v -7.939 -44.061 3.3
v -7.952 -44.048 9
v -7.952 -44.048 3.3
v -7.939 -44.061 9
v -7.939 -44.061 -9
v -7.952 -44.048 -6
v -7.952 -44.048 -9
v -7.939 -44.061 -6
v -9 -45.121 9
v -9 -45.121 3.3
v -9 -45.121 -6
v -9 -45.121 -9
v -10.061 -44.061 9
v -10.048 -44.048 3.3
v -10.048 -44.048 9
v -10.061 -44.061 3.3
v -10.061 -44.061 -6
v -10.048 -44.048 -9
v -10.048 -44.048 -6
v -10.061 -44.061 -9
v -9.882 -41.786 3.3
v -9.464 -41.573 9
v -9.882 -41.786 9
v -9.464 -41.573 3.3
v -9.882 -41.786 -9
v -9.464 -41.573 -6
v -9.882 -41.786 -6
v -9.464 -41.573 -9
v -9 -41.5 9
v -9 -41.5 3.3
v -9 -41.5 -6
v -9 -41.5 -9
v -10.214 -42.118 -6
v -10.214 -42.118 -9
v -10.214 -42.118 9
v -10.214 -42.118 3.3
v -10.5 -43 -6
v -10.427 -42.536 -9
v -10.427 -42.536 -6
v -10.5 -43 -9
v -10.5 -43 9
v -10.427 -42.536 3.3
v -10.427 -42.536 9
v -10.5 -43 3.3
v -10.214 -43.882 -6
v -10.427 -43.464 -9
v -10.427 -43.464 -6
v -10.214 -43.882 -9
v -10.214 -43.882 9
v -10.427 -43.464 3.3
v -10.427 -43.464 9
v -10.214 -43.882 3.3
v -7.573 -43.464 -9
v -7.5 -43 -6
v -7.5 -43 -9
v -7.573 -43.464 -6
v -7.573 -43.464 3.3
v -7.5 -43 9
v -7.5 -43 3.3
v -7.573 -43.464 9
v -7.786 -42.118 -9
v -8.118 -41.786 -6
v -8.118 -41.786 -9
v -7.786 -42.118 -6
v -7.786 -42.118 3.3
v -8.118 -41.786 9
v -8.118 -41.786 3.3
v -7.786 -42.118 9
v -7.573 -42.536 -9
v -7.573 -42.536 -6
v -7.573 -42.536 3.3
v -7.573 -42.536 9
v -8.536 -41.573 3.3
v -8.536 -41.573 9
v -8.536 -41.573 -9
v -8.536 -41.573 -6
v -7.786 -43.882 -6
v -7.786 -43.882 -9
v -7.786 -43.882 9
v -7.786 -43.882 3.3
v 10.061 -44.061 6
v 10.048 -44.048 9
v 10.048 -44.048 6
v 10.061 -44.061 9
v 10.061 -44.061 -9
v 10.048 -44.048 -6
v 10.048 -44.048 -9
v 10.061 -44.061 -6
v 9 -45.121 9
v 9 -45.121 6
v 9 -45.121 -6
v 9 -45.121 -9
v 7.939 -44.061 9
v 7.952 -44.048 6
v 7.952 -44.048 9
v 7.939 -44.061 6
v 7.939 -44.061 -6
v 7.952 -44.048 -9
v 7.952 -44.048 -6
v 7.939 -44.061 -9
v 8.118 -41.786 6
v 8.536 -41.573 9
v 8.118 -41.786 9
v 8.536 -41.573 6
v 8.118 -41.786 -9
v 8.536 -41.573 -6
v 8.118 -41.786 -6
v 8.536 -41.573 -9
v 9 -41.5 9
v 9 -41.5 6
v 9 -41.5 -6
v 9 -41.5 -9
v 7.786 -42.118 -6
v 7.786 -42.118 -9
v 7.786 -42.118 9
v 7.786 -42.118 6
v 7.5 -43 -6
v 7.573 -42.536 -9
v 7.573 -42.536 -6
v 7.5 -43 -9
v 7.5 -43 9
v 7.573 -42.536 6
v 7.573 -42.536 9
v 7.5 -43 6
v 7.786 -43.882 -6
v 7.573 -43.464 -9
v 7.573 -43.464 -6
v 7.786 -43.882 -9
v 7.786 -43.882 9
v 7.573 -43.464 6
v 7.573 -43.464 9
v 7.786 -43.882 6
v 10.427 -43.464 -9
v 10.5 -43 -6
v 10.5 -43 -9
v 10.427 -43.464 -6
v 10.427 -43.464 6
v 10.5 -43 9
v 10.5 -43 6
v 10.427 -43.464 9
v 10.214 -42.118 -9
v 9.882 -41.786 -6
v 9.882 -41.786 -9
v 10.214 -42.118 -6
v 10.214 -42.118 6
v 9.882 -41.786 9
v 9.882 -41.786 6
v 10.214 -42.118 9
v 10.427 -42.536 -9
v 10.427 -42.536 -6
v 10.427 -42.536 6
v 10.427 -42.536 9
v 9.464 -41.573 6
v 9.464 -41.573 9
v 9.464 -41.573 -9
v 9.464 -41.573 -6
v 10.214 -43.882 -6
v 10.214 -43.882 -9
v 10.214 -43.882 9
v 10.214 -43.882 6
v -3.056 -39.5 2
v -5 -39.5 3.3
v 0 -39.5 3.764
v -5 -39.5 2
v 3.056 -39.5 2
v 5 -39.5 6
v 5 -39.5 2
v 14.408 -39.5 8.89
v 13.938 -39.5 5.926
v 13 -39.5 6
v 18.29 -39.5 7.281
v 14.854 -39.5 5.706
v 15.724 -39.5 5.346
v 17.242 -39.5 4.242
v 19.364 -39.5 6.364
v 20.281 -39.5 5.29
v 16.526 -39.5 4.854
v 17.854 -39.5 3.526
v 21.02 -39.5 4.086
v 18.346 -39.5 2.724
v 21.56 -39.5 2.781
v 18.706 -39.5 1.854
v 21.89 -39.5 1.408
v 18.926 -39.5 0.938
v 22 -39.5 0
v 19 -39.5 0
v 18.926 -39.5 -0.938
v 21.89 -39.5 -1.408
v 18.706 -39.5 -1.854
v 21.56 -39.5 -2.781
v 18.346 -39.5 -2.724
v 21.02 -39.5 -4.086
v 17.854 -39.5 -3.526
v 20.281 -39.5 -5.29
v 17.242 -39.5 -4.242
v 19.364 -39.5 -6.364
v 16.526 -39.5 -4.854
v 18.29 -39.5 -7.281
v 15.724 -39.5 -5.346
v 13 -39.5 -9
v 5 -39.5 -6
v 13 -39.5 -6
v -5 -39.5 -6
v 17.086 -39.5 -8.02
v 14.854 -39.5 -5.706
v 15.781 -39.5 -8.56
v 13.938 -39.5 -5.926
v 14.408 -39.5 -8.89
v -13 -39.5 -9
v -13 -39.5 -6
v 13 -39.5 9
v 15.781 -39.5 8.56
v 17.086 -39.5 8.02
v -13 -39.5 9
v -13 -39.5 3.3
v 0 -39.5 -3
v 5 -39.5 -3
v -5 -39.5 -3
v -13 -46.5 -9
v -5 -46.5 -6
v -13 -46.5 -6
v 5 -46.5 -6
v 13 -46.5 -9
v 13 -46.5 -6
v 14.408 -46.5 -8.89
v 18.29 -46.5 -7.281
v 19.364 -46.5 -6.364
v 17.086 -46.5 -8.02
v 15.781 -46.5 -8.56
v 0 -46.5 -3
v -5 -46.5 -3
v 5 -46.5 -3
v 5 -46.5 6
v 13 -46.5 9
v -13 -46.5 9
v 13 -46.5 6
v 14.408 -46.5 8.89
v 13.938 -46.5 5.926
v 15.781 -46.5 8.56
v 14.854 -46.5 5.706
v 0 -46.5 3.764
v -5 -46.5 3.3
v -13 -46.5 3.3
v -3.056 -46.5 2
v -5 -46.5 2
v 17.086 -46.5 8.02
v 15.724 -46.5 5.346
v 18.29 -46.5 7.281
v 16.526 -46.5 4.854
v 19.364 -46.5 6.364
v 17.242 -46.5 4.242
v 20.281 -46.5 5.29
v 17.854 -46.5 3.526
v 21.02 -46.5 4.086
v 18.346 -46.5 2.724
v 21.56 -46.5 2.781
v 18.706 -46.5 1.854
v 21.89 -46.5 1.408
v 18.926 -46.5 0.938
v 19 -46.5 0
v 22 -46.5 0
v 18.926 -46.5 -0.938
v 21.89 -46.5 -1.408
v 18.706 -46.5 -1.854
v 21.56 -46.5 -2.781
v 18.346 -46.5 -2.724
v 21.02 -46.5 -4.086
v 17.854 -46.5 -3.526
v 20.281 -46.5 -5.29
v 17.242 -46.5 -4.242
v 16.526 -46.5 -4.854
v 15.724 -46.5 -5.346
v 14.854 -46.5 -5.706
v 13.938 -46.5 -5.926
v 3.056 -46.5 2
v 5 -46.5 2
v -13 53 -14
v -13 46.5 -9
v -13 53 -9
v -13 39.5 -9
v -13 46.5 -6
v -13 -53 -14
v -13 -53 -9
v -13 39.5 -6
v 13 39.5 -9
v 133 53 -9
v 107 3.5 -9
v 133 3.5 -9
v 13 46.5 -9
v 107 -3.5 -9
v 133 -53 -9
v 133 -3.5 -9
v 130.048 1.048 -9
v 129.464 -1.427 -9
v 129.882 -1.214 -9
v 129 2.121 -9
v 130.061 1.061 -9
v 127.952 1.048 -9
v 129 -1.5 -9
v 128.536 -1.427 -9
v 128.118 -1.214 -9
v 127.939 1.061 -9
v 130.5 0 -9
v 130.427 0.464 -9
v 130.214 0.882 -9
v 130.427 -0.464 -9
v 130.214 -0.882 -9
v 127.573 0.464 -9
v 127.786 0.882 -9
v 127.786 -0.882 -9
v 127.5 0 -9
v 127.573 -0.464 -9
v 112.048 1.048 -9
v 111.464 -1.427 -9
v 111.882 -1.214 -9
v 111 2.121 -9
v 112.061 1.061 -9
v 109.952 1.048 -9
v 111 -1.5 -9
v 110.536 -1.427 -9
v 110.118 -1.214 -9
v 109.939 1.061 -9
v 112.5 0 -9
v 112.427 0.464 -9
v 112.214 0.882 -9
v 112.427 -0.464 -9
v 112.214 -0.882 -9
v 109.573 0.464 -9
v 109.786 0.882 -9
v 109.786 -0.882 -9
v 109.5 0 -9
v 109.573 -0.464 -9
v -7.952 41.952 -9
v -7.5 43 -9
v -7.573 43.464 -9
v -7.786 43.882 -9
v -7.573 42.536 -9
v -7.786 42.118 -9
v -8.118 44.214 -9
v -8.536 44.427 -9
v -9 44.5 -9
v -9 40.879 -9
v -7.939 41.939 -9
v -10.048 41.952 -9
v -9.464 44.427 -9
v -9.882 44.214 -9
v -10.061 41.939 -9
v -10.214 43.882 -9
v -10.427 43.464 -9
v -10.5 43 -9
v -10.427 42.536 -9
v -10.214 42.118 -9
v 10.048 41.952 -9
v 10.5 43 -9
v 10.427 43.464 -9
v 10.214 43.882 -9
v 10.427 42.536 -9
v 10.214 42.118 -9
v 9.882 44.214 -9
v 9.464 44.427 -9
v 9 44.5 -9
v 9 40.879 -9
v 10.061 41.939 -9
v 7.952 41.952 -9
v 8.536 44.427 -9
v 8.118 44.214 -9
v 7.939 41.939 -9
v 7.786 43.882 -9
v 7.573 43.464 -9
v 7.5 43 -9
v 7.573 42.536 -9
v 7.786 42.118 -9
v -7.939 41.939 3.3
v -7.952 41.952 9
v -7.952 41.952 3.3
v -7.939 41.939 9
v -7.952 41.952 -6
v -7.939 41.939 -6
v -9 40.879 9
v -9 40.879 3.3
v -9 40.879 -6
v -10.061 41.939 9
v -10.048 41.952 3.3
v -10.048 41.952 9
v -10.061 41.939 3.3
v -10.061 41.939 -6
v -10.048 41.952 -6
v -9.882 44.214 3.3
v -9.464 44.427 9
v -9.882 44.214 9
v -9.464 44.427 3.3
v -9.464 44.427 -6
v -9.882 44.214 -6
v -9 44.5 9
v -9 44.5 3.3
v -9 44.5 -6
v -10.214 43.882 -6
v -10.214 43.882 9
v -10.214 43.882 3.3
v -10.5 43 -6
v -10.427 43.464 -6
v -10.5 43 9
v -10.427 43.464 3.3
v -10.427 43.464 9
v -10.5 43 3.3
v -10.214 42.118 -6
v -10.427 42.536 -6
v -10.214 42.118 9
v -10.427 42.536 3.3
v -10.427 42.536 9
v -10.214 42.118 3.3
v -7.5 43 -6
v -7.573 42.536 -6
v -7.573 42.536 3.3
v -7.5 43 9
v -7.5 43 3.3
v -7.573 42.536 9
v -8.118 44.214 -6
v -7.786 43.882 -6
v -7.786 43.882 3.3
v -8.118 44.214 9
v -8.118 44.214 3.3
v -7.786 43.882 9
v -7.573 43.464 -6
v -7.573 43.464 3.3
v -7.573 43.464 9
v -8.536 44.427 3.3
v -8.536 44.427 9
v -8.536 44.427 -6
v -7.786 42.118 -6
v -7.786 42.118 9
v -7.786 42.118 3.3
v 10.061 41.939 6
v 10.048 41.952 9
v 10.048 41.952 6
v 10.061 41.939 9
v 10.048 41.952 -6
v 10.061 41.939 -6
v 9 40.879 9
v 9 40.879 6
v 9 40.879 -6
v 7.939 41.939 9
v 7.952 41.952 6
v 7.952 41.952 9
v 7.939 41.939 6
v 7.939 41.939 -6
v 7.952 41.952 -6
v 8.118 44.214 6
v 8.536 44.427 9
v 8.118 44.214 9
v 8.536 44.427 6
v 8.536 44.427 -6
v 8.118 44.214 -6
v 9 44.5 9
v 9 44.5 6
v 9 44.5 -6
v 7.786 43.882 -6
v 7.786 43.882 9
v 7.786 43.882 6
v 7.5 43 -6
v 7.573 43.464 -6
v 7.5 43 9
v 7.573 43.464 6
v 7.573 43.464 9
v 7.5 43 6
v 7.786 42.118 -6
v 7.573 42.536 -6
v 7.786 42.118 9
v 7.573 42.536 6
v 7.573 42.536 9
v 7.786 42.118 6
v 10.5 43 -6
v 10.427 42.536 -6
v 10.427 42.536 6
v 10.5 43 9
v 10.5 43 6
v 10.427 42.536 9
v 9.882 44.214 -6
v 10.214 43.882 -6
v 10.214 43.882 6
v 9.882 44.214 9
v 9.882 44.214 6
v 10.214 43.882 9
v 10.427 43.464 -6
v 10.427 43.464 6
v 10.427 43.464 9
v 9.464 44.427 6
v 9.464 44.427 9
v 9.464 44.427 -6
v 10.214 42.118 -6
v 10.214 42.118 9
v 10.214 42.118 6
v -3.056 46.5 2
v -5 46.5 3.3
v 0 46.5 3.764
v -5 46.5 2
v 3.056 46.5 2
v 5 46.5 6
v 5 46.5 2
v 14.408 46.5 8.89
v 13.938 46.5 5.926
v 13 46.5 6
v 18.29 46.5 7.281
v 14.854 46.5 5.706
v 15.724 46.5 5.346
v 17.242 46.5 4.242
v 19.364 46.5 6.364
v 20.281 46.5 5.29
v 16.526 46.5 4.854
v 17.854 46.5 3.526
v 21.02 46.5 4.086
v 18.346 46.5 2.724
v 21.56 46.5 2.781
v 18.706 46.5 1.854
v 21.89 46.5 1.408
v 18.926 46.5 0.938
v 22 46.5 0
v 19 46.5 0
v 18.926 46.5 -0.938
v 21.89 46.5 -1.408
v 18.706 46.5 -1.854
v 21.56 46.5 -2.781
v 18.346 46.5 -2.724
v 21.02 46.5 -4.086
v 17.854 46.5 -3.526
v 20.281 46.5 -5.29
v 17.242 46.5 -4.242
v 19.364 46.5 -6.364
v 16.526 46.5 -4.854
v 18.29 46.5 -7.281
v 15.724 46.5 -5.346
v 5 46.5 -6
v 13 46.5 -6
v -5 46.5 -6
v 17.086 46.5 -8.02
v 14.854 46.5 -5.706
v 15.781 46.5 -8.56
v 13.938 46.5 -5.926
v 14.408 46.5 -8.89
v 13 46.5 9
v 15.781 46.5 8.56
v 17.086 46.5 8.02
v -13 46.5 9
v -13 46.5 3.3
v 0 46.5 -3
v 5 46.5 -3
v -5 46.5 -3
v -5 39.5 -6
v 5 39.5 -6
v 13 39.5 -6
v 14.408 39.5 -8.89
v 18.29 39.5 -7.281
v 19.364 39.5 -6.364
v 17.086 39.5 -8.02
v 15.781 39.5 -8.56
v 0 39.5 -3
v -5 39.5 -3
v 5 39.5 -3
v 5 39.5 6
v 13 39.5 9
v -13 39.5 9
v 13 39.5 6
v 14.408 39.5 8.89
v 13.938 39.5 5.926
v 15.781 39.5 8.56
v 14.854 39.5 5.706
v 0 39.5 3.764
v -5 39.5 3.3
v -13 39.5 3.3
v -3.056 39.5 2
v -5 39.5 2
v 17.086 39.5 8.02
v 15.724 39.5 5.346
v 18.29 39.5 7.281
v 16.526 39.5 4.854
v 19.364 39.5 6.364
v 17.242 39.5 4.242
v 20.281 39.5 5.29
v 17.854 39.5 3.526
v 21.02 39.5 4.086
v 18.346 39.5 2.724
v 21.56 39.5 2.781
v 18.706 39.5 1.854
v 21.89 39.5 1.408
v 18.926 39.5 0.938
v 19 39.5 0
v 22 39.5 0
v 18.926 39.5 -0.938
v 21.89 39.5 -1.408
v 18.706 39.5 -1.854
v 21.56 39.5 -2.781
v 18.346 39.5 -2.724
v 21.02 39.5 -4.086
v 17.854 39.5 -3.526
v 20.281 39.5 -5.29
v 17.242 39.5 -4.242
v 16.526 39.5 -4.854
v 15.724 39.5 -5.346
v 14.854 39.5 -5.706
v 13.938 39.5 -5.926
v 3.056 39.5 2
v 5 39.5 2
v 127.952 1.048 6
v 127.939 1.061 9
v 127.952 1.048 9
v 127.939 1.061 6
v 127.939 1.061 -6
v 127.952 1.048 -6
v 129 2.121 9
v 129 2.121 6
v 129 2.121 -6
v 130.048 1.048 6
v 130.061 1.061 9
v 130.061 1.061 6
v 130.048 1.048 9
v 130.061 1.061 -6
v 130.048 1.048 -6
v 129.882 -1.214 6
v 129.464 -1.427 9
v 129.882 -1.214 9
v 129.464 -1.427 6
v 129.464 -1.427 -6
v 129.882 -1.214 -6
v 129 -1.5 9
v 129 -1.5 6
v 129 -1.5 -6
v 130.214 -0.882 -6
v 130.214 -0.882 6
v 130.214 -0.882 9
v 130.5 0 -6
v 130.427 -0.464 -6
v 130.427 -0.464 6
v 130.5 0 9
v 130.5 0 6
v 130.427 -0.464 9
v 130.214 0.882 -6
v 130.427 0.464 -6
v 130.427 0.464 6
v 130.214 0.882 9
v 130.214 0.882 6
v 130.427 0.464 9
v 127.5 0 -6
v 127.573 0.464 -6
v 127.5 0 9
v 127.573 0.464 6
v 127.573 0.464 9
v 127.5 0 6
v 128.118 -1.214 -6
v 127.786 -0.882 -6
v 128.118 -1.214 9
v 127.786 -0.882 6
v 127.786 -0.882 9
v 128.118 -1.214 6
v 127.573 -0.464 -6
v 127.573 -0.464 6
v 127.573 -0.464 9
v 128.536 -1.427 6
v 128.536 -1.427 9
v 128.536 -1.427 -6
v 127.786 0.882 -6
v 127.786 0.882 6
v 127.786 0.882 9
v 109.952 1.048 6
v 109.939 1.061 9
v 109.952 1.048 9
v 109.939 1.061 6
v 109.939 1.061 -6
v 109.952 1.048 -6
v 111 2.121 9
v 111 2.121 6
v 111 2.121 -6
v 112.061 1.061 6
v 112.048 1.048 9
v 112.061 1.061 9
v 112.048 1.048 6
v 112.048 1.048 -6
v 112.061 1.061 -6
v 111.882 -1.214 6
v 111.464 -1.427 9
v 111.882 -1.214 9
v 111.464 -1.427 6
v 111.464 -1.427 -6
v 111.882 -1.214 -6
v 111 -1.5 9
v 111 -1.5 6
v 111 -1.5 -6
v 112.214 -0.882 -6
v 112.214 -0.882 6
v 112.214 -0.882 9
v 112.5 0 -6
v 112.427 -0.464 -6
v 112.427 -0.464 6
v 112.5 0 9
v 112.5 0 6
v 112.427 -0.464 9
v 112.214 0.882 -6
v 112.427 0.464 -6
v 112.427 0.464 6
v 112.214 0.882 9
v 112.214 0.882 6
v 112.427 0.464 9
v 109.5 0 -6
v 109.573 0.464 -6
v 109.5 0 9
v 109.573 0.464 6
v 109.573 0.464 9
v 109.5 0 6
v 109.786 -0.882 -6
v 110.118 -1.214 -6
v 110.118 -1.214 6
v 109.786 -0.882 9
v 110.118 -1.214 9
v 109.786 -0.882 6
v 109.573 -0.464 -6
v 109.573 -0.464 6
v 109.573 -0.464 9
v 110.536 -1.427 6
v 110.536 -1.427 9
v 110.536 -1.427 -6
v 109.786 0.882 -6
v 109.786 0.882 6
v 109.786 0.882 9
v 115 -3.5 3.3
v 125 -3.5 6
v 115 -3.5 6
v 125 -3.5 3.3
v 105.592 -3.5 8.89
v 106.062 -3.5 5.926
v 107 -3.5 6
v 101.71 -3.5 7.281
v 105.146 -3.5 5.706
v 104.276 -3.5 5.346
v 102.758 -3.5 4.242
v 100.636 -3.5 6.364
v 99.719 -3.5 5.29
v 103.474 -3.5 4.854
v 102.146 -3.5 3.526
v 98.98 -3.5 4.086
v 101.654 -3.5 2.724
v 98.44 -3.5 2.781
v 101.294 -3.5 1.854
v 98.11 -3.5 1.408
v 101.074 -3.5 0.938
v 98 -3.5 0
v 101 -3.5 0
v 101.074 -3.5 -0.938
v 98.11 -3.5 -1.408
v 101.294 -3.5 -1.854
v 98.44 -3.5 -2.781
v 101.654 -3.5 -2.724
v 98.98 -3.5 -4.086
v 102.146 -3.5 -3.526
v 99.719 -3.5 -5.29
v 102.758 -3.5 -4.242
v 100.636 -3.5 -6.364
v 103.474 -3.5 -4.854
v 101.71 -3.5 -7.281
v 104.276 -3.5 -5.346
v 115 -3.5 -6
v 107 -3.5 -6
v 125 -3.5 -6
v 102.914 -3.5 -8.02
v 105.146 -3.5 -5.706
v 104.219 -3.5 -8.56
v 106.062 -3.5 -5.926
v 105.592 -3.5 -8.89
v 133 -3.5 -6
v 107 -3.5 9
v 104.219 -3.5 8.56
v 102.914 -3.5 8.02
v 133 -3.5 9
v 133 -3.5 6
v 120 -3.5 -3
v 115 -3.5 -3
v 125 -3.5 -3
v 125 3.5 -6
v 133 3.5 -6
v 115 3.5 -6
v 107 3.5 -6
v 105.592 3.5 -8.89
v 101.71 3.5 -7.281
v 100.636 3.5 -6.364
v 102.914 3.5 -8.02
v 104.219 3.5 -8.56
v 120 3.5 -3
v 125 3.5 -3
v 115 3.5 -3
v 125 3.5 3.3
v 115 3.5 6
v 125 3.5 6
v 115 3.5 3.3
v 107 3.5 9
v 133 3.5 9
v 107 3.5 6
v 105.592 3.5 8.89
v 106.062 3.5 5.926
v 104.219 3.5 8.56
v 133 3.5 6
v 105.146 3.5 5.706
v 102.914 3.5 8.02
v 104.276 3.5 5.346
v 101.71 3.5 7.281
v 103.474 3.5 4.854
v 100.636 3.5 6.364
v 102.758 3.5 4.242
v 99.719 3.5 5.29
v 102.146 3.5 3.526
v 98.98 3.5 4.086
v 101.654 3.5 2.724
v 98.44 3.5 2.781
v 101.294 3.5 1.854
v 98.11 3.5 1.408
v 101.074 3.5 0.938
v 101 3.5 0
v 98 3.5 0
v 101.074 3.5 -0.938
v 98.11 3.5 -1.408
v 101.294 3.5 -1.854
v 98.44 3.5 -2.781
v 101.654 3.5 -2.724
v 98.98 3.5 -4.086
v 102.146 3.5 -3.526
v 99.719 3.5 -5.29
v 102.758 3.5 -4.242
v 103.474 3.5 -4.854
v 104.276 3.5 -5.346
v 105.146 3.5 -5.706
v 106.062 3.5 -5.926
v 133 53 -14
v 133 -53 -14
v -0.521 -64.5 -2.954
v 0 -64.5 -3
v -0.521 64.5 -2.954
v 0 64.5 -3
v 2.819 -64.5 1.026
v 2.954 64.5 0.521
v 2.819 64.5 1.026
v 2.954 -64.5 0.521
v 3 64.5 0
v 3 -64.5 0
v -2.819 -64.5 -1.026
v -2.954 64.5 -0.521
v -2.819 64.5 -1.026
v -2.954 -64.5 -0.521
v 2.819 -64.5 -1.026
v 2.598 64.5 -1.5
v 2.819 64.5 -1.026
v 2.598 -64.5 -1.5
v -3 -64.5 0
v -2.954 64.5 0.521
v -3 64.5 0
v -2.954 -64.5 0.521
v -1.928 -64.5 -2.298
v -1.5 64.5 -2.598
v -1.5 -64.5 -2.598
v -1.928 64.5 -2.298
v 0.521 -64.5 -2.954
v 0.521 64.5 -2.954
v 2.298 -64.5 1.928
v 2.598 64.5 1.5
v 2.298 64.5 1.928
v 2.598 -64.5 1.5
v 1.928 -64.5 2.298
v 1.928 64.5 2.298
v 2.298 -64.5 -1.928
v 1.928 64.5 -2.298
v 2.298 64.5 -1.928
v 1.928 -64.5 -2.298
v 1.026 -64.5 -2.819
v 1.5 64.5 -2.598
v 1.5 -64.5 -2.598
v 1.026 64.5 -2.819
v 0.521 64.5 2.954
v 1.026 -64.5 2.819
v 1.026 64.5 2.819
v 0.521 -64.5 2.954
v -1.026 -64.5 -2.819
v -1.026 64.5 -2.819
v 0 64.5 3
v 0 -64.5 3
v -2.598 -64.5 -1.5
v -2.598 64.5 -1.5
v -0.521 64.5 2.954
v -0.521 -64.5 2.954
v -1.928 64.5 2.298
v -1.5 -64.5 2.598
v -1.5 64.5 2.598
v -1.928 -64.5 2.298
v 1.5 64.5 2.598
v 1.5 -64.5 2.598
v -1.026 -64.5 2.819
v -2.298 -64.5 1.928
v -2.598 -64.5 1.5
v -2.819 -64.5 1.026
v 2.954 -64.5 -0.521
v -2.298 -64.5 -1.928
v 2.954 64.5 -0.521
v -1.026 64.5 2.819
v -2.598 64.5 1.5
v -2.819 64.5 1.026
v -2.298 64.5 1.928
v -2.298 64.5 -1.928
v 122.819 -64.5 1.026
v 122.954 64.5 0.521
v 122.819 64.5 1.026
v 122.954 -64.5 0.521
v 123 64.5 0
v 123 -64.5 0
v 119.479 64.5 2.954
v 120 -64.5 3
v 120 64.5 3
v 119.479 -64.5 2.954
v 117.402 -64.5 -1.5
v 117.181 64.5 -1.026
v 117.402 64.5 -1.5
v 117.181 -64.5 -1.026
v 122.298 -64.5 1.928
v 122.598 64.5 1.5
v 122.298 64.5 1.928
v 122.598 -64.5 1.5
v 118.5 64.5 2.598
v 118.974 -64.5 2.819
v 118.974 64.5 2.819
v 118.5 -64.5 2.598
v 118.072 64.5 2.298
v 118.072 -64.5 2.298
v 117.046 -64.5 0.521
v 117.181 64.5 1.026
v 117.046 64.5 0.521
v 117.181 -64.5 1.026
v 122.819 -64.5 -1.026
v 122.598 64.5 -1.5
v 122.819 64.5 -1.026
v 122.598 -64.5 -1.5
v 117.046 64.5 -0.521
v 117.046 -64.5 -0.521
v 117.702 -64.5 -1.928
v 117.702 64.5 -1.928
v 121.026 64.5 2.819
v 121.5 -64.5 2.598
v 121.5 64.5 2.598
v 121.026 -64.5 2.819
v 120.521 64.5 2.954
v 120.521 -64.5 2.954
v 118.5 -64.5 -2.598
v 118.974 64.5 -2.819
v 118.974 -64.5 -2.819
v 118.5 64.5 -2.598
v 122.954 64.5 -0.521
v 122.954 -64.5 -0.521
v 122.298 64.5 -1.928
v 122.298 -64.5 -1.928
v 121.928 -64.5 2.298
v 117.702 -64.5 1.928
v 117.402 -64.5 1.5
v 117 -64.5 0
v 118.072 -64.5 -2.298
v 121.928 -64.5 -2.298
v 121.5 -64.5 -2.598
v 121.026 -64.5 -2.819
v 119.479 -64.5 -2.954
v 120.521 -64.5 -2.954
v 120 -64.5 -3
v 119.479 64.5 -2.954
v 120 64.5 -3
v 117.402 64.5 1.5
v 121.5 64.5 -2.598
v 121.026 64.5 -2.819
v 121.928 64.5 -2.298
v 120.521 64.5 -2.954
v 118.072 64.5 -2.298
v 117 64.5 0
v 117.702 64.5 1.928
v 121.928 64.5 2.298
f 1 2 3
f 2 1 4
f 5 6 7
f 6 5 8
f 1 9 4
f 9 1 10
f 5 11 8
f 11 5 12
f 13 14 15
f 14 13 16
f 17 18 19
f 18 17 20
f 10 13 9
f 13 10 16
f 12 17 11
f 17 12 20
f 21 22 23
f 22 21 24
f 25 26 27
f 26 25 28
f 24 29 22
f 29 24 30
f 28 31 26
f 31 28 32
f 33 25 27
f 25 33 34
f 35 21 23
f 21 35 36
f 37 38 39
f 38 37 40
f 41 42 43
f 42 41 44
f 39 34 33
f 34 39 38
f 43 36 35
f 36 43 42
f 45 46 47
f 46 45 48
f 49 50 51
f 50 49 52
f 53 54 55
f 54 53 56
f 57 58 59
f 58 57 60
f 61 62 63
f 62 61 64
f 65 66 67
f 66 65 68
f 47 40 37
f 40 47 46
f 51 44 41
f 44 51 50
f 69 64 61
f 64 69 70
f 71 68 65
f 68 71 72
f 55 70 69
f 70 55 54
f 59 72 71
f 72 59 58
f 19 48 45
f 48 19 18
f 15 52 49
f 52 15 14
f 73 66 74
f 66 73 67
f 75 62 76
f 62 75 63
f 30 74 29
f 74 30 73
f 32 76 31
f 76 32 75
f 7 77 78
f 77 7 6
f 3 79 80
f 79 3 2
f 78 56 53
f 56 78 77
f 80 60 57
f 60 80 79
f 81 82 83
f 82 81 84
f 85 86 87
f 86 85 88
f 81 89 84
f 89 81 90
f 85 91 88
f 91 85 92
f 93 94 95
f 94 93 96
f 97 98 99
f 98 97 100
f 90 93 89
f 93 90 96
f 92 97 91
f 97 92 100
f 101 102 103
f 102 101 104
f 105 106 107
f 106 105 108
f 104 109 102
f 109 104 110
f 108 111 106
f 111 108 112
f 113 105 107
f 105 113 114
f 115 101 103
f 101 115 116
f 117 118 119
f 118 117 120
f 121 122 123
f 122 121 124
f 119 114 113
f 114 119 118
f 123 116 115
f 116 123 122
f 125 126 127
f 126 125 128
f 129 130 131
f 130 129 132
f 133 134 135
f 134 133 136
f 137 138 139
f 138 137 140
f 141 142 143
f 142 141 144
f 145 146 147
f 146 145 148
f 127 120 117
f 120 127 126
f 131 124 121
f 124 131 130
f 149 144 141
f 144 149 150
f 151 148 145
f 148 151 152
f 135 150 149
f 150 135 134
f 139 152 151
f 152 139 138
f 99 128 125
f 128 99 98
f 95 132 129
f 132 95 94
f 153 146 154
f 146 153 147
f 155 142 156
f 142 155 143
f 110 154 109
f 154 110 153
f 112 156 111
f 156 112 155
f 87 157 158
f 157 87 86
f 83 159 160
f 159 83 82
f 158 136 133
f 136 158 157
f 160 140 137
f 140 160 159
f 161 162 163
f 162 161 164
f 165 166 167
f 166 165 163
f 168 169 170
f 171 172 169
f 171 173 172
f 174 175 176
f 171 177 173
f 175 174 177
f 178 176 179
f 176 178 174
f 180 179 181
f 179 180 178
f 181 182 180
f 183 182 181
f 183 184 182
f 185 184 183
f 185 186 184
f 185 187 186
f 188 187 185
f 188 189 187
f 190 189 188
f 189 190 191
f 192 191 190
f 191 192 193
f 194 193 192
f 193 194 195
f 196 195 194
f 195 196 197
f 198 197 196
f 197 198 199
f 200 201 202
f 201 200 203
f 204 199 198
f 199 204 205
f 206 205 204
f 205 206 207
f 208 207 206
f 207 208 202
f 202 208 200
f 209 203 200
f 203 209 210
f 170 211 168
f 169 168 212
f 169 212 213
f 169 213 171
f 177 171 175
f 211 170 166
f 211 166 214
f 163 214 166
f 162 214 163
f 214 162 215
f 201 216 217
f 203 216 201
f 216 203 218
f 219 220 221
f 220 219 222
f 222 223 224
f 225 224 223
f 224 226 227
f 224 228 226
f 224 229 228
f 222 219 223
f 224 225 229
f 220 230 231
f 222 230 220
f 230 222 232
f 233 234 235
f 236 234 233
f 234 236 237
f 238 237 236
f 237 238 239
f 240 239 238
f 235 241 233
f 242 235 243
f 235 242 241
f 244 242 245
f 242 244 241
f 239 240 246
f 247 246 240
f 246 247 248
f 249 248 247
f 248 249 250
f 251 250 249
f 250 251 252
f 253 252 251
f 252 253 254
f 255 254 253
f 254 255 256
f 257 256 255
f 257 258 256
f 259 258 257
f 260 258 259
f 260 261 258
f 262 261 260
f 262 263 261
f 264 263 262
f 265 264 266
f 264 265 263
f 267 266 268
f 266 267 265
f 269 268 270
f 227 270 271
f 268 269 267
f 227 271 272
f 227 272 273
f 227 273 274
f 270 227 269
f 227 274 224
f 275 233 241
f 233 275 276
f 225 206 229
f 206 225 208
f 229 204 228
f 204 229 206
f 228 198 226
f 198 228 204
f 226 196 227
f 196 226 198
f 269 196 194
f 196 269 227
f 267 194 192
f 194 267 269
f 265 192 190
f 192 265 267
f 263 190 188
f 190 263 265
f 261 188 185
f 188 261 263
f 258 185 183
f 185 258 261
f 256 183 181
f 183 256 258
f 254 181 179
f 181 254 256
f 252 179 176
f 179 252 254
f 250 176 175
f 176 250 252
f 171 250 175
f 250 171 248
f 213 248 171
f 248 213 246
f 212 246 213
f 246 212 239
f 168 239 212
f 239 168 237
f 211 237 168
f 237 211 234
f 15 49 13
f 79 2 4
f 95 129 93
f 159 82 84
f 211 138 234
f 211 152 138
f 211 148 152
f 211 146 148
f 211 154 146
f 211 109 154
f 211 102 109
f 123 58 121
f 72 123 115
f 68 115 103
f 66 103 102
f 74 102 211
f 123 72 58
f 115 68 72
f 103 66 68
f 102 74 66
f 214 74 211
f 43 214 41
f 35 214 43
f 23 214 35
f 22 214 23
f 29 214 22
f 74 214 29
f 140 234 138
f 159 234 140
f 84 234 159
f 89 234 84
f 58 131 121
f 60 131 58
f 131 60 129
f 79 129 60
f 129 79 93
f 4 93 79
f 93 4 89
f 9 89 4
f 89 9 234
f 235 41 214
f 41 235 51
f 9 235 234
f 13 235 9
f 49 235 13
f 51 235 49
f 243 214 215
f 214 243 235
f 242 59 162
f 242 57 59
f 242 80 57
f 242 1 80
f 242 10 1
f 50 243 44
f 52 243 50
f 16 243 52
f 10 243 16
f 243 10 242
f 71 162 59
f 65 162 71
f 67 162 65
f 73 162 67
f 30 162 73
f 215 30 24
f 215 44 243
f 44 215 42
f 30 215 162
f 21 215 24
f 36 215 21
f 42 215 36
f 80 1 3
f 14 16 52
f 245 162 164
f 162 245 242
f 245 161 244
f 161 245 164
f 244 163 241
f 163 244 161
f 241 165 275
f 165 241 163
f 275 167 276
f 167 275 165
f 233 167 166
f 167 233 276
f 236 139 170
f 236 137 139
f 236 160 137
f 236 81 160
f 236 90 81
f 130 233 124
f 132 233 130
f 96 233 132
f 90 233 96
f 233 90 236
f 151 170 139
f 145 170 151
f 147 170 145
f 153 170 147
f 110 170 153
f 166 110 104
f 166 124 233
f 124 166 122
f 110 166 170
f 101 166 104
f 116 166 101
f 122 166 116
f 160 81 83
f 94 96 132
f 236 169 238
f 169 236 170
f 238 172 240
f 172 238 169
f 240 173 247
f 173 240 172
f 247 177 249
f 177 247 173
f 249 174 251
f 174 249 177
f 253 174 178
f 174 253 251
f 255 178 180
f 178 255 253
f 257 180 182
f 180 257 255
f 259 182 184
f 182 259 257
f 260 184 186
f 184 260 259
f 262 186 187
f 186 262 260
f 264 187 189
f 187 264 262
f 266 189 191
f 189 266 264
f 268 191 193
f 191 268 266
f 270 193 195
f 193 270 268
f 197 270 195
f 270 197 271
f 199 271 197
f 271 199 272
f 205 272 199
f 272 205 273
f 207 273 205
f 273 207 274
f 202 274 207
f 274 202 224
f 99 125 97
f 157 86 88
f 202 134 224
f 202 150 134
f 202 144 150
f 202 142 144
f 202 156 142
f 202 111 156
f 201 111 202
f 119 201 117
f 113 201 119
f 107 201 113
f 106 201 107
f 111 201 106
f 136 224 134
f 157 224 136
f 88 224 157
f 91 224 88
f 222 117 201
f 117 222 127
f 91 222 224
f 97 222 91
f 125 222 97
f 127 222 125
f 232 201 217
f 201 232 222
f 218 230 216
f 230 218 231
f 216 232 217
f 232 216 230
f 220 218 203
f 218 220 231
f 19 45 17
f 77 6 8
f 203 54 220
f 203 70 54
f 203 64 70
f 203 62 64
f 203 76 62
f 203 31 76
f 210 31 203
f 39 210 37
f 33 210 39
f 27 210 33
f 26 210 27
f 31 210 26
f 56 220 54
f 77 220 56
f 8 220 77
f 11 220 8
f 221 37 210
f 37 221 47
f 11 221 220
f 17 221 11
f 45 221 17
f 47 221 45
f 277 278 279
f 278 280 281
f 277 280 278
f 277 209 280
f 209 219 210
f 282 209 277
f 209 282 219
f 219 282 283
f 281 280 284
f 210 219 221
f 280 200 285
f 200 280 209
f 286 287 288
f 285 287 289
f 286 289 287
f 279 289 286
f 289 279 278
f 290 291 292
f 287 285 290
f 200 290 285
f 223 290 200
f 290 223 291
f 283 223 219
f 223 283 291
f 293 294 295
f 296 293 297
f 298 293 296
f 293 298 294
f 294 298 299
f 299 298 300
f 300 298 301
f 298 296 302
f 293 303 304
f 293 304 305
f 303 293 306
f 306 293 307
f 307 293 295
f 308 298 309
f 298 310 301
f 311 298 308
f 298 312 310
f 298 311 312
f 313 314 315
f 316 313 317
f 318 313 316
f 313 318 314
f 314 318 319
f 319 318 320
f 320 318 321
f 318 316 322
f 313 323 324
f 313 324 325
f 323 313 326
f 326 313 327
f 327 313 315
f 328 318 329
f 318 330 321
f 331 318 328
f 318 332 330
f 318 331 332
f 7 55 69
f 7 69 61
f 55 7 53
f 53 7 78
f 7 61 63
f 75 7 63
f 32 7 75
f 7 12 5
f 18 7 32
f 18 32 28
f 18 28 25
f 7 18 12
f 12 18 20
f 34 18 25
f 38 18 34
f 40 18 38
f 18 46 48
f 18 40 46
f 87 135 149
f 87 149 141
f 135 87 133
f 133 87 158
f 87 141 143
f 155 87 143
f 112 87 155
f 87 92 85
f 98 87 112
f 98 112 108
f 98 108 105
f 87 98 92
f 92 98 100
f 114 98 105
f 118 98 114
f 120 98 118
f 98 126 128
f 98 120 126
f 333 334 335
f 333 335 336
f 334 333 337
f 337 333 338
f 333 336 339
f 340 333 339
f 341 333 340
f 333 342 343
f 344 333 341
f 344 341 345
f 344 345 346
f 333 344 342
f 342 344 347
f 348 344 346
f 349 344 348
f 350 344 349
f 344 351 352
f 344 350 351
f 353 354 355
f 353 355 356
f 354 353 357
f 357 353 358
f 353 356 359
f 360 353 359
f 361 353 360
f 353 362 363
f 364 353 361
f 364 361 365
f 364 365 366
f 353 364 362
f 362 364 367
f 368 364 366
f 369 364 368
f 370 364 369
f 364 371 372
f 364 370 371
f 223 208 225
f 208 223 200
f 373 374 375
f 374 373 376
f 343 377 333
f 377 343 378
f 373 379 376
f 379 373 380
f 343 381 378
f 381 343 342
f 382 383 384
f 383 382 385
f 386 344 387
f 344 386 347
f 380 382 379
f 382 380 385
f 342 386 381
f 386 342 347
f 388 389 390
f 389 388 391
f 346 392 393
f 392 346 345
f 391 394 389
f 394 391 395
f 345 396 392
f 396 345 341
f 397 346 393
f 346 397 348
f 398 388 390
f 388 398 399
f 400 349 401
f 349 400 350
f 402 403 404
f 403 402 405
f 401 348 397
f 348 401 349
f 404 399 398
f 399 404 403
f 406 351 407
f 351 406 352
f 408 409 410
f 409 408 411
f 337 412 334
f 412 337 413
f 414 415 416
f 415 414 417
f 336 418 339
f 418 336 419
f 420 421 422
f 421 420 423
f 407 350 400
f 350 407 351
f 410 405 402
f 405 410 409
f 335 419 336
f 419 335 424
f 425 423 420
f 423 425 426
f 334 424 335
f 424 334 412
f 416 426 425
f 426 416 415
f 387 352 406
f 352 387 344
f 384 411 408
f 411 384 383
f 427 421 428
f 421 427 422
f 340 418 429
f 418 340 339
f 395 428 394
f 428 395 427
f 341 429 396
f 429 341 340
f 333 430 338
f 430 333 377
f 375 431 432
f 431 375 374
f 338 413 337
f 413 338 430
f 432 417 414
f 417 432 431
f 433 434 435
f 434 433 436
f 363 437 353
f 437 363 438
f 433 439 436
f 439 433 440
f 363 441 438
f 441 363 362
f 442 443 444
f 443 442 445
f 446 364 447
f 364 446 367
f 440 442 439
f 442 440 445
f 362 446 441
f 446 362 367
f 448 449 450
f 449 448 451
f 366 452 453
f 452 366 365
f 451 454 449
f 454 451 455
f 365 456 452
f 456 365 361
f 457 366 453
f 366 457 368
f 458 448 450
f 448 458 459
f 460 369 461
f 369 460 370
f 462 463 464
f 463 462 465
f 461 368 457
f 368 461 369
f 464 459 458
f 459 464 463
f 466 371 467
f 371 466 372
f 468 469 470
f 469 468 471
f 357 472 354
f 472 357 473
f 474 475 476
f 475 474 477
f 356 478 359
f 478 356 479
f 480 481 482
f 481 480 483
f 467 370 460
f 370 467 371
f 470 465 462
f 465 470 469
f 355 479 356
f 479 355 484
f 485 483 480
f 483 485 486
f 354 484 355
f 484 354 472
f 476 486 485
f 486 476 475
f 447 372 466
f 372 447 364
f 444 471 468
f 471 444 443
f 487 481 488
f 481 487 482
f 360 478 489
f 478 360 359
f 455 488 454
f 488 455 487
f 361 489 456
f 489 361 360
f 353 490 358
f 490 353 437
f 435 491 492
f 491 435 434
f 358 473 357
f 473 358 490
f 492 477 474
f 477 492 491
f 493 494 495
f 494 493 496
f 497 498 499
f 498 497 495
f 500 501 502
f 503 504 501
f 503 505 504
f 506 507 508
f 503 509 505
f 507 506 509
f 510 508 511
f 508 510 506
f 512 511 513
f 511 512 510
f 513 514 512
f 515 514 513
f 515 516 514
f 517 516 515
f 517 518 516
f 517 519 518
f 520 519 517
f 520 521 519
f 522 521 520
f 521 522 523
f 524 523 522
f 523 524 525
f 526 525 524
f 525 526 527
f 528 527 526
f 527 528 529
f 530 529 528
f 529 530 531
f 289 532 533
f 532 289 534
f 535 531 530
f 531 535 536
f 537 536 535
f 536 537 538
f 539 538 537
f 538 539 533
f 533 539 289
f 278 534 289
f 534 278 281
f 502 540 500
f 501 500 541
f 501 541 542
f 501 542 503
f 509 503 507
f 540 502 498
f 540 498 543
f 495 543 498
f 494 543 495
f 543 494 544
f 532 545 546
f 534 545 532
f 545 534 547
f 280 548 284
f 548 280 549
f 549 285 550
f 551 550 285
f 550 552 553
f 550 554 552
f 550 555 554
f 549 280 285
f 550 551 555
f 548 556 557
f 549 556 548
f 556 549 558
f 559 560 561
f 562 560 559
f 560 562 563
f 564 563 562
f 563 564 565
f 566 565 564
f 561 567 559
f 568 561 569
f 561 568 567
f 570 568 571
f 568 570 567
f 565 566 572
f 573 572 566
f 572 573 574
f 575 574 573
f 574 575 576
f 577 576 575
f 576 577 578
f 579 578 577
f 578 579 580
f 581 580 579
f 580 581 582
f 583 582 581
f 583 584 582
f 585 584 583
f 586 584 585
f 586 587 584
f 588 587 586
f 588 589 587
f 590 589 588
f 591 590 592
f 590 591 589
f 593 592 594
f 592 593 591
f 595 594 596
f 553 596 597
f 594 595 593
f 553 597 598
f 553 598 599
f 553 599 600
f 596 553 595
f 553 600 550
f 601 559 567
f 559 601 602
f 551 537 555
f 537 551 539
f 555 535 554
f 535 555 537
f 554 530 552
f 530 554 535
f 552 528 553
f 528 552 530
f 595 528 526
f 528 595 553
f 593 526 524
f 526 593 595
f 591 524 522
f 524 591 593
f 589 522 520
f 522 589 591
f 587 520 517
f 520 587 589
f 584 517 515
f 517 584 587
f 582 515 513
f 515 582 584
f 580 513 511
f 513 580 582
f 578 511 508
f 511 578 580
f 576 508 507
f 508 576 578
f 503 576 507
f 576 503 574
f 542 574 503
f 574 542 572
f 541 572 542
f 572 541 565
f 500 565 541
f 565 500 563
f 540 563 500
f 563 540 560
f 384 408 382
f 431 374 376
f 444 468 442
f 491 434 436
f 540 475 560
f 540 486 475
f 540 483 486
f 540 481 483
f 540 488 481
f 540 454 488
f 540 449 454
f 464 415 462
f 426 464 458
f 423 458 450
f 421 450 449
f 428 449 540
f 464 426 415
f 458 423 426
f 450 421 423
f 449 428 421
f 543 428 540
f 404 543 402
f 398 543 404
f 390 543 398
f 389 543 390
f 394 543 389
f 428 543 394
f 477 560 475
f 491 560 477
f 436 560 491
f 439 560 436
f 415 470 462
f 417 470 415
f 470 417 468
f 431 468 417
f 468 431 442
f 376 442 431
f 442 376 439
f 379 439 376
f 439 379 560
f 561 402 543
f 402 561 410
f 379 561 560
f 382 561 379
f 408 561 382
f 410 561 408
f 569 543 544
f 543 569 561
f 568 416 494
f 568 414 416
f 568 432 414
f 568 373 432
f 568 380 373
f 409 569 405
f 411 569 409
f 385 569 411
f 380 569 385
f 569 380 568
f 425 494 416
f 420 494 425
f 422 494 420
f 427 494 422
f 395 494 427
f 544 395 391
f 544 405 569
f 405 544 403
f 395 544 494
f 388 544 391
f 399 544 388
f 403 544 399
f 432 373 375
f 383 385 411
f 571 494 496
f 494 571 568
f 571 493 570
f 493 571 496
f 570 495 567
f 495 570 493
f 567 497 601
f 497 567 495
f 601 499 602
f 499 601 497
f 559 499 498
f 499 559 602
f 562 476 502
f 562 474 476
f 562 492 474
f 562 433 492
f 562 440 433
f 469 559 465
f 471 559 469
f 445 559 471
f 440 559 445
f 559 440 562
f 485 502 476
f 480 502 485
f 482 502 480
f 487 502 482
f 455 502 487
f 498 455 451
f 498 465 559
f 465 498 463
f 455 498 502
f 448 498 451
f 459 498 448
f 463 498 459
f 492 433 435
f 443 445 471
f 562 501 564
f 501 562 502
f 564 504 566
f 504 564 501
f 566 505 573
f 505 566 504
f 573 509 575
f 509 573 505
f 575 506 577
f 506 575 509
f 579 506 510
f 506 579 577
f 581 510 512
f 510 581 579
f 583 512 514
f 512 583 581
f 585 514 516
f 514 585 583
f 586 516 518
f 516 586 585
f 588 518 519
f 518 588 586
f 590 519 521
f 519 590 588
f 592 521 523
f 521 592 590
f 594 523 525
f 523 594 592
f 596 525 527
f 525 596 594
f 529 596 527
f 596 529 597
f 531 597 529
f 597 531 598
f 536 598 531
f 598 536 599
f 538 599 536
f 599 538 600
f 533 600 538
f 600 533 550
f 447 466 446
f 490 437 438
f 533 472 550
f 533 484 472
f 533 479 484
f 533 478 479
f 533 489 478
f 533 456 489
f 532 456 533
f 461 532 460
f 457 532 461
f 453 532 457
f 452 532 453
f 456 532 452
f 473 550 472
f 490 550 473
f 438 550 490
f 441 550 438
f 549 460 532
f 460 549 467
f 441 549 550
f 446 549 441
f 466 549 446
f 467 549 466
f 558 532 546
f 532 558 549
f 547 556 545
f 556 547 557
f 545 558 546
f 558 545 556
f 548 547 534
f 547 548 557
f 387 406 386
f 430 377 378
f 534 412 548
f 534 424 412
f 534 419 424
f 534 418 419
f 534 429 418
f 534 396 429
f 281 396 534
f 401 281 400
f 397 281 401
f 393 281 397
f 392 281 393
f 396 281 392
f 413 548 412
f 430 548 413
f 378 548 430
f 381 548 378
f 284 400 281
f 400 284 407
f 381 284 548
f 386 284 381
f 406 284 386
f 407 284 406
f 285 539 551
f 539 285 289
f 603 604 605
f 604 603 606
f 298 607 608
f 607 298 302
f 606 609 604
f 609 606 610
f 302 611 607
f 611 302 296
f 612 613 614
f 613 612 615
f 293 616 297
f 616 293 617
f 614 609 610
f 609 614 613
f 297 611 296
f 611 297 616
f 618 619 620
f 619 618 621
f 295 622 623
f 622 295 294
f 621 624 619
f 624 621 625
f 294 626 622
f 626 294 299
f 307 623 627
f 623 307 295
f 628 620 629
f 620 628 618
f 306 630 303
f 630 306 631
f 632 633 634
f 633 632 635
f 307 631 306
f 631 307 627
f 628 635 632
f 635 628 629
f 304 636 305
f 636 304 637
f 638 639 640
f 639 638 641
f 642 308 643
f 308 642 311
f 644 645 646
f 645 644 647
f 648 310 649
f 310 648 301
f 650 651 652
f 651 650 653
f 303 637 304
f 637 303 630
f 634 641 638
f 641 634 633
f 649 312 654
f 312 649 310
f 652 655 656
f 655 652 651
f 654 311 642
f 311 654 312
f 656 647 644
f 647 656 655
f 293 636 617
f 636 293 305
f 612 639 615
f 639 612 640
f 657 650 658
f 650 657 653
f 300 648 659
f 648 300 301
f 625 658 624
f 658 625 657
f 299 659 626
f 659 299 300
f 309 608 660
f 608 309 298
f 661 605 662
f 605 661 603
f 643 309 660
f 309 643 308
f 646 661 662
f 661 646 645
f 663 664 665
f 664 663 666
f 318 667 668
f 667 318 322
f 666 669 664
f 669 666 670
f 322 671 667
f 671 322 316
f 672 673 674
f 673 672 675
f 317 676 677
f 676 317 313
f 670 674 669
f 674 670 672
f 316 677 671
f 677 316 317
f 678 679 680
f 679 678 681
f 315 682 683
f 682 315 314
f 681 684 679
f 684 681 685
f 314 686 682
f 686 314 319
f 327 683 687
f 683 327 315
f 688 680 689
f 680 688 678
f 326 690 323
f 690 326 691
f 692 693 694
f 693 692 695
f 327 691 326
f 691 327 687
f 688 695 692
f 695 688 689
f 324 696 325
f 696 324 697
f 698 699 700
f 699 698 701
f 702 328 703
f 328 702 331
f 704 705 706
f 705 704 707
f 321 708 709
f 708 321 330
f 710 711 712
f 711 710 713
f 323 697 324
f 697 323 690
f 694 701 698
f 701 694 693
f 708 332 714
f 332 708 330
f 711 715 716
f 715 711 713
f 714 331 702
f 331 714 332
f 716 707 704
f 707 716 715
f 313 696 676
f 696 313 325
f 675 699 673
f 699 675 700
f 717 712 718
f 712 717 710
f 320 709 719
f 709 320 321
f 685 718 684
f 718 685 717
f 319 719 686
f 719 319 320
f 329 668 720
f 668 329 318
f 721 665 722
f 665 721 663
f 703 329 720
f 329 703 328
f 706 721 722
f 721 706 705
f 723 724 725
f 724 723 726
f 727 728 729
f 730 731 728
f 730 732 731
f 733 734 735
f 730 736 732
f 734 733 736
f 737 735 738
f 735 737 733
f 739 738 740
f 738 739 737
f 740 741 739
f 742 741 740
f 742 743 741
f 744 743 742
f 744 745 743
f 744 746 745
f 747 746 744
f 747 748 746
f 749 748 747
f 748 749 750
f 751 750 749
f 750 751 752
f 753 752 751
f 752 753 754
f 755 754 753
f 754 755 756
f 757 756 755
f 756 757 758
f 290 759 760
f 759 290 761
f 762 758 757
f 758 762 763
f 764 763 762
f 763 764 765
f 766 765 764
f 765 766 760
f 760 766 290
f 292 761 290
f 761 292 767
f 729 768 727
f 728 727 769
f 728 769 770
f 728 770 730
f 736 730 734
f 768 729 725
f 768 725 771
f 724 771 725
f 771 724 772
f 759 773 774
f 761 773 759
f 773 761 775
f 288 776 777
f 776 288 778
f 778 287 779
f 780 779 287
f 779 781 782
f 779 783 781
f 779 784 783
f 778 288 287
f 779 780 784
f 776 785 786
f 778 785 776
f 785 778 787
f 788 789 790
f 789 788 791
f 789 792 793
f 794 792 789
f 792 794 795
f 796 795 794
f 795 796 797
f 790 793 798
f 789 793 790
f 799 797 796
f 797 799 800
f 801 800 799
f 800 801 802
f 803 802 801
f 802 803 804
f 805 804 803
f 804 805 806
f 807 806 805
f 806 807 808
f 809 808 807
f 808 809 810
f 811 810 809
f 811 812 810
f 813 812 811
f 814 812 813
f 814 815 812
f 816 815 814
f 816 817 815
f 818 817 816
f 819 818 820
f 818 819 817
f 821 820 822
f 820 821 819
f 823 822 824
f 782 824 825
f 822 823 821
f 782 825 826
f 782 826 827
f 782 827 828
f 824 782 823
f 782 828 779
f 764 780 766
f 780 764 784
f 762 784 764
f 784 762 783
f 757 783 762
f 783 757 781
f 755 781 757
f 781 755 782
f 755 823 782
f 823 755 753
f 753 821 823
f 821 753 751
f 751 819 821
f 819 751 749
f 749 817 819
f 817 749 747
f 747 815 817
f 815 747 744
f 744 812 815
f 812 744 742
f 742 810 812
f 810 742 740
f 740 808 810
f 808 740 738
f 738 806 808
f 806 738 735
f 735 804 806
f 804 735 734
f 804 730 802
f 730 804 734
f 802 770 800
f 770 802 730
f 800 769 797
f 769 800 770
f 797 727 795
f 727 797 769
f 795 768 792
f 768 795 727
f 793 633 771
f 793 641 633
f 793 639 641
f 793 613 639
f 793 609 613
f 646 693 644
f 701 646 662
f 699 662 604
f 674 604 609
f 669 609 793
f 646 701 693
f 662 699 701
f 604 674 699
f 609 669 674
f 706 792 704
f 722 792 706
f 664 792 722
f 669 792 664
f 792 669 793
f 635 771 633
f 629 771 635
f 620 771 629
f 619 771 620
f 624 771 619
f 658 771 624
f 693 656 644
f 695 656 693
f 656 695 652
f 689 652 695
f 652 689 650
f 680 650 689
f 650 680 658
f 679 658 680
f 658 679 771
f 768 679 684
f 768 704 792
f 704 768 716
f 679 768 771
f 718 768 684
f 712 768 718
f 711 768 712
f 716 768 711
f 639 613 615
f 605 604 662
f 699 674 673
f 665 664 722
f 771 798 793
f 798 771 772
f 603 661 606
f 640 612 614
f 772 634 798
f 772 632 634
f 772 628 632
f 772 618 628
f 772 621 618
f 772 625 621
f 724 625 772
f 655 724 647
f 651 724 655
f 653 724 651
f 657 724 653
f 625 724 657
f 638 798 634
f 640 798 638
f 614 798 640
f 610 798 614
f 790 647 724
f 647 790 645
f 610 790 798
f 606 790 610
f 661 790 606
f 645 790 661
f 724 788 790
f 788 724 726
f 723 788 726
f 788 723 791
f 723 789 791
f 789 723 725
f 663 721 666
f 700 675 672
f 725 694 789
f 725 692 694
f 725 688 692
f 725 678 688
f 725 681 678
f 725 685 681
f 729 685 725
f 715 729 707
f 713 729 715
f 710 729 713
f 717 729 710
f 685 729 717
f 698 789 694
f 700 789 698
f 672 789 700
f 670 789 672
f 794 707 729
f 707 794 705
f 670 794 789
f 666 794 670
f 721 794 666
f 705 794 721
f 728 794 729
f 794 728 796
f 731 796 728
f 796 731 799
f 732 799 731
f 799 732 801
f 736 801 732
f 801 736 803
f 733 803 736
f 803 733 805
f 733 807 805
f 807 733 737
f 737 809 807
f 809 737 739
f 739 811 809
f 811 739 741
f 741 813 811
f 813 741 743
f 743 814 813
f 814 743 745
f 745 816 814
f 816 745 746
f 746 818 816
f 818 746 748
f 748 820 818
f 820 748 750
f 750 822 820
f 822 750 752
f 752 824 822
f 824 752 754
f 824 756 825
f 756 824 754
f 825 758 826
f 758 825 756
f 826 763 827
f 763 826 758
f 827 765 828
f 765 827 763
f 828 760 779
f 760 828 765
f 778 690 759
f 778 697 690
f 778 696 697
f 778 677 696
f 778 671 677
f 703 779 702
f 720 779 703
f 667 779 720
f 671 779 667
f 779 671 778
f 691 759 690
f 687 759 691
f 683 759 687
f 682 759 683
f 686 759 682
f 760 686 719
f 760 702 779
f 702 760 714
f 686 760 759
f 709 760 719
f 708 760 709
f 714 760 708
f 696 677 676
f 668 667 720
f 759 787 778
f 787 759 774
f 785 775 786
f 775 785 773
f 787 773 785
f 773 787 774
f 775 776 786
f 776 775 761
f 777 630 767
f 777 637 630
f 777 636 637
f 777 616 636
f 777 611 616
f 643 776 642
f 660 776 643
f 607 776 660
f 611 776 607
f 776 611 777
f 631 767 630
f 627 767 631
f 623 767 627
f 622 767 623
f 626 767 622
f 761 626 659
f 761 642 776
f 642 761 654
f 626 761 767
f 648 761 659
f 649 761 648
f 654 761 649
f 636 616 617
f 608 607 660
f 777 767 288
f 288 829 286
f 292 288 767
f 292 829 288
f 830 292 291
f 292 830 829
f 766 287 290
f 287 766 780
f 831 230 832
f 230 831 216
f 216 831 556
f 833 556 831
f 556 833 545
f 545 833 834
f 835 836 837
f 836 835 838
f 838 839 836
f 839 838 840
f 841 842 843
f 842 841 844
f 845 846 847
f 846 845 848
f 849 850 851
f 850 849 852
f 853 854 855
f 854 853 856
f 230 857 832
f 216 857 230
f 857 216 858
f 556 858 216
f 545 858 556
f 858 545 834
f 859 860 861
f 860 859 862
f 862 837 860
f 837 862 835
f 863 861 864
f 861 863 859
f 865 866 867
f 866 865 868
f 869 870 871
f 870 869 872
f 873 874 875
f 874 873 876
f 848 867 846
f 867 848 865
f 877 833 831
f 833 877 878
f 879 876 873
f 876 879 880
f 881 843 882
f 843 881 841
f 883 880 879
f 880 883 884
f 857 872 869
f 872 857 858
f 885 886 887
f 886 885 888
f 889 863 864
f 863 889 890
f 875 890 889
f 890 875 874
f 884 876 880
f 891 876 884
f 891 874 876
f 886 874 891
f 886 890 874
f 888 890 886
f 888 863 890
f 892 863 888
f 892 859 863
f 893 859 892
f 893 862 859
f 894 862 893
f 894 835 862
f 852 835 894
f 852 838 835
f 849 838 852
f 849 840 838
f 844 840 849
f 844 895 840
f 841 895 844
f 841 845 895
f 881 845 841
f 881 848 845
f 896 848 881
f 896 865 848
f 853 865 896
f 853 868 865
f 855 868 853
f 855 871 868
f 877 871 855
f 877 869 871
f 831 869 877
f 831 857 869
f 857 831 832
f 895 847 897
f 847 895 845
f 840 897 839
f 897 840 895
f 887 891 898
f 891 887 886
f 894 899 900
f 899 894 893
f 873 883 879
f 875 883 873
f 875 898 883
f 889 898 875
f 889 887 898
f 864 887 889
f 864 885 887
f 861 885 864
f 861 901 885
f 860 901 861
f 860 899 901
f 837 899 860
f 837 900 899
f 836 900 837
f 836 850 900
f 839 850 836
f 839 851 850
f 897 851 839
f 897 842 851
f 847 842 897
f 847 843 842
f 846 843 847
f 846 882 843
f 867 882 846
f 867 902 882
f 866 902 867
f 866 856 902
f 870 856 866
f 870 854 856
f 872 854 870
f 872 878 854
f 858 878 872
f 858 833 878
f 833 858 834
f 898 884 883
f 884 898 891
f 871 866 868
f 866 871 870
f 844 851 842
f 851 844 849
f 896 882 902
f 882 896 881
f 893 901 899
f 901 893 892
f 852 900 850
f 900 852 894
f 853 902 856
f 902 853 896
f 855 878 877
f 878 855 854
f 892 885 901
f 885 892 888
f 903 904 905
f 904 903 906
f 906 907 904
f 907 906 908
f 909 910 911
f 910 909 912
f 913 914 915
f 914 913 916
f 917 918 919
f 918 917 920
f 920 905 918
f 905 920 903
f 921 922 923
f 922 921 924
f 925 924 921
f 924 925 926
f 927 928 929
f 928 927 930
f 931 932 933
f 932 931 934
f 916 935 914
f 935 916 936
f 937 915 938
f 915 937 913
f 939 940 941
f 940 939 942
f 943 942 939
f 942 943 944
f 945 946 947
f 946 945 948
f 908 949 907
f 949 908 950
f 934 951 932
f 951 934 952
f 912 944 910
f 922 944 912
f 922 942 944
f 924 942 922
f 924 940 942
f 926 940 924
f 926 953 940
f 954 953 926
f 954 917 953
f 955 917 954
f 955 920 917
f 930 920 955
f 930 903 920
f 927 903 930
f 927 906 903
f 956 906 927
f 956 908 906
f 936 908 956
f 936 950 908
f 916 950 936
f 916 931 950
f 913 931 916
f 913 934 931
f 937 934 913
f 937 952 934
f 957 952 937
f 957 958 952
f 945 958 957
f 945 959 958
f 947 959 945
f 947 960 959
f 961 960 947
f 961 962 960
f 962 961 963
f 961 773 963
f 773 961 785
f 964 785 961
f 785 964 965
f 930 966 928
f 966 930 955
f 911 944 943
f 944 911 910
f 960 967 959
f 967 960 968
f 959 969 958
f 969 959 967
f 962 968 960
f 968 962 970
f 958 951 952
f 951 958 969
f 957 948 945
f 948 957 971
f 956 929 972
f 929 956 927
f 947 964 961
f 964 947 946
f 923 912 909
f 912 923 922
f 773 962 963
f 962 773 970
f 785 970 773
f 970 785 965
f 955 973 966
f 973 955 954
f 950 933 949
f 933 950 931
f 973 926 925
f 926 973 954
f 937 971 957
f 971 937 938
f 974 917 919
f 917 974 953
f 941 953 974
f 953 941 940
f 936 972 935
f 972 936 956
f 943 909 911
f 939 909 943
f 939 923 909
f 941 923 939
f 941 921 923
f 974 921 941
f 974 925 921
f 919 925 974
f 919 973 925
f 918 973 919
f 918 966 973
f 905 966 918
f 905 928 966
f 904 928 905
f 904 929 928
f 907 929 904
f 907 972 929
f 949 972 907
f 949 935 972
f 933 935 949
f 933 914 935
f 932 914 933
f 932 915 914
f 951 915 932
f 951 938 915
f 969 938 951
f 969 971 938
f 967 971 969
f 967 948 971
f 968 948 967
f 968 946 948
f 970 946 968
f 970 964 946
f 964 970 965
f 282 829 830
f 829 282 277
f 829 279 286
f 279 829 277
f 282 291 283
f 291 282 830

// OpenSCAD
// file: parameters.scad
// Parameters file for RepRap Huxley

pi=3.14159265;

// The relative location in your file system where the .dxf files are
// DXFs are for quick development.  They should be replaced by parameterised CSG in dure course.

fileroot="DXF-files/";

rodsize = 6;	//threaded/smooth rod diameter in mm
xaxis = 182.5;	//width of base in mm
yaxis = 266.5;	//length of base in mm


screwsize = 3;	//bearing bore/screw diameter in mm
bearingsize = 10;	//outer diameter of bearings in mm
bearingwidth = 4;	//width of bearings in mm


rodpitch = rodsize / 6;
rodnutsize = 0.8 * rodsize;
rodnutdiameter = 1.9 * rodsize;
rodwashersize = 0.2 * rodsize;
rodwasherdiameter = 2 * rodsize;
screwpitch = screwsize / 6;
nutsize = 0.8 * screwsize;
nutdiameter = 1.9 * screwsize;
washersize = 0.2 * screwsize;
washerdiameter = 2 * screwsize;
partthick = 2 * rodsize;
vertexrodspace = 2 * rodsize;


c = [0.3, 0.3, 0.3];
rodendoffset = rodnutsize + rodwashersize * 2 + partthick / 2;
vertexoffset = vertexrodspace + rodendoffset;


renderrodthreads = false;
renderscrewthreads = false;
fn = 36;

// The gap between the joining rods at a vertex

vertex_radius=sqrt(rodsize*rodsize + vertexoffset*vertexoffset);
vertex_ang = atan(vertexoffset/rodsize)-30;
vertex_gap = 2*vertex_radius*cos(vertex_ang);

// Nema 14 dimensions - these are absolute

nema14_square=35.3;
nema14_screws=26;
nema14_screw_r=1.5;
nema14_hub=22;
nema14_hub_depth=2;
nema14_length=36;
nema14_shaft=5;
nema14_shaft_length=66;
nema14_shaft_projection=19;

// Nema 11 dimensions - these are absolute

nema11_square=28.5;
nema11_screws=23;
nema11_screw_r=1.25;
nema11_hub=22;
nema11_hub_depth=2;
nema11_length=44.5;
nema11_shaft=5;
nema11_shaft_length=78;
nema11_shaft_projection=18;

// Limit switch parameters

limit_switch_hole_diameter=2.5;
limit_switch_centres=9.5;

// The RepRap slide bearings

bearing_mount_centres=18;
bearing_width=7;

// X axis parameters - many should be relative

x_bar_gap=30;
motor_center_y = 26;
bar_clamp_x=5;
bar_clamp_y=8;
bar_clamp_x_gap=23;
bearing_y=50;
bearing_x=bar_clamp_x_gap + 10;
hole_land=4;
thickness=5;
bearing_low_z = 8;
bearing_z_gap = 25;
bearing_plate_width = bearing_mount_centres+2*hole_land + 10;
bearing_plate_overlap=0.5;
bearing_plate_support=10;
// main file
include <parameters.scad>;
use <library.scad>;

xbars=120;
ylength=86;
d=22;
w=5;

// Triangle values

yl2 = ylength/2;
a = (yl2*yl2 + xbars*xbars)/(2*xbars);
b = xbars - a;
theta = atan(xbars/yl2);


module accesories(holes=false)
{
	for(i=[-1,1])
		translate([0,i*yl2,0])
			rotate([-90,180,180])
				adjustable_bearing(true,holes);
	
	translate([xbars,0,0])
		rotate([-90,180,0])
			adjustable_bearing(false,holes);
	if(!holes)
	{
		rotate([90,0,0])
			rod(1.5*ylength,false);
		
		translate([xbars,0,0])
			rotate([90,0,0])
				rod(1.5*ylength,false);
	}
}

accesories(false);

translate([-13, -yl2-10,-14])
cube([xbars+26, ylength+20, 5]);
